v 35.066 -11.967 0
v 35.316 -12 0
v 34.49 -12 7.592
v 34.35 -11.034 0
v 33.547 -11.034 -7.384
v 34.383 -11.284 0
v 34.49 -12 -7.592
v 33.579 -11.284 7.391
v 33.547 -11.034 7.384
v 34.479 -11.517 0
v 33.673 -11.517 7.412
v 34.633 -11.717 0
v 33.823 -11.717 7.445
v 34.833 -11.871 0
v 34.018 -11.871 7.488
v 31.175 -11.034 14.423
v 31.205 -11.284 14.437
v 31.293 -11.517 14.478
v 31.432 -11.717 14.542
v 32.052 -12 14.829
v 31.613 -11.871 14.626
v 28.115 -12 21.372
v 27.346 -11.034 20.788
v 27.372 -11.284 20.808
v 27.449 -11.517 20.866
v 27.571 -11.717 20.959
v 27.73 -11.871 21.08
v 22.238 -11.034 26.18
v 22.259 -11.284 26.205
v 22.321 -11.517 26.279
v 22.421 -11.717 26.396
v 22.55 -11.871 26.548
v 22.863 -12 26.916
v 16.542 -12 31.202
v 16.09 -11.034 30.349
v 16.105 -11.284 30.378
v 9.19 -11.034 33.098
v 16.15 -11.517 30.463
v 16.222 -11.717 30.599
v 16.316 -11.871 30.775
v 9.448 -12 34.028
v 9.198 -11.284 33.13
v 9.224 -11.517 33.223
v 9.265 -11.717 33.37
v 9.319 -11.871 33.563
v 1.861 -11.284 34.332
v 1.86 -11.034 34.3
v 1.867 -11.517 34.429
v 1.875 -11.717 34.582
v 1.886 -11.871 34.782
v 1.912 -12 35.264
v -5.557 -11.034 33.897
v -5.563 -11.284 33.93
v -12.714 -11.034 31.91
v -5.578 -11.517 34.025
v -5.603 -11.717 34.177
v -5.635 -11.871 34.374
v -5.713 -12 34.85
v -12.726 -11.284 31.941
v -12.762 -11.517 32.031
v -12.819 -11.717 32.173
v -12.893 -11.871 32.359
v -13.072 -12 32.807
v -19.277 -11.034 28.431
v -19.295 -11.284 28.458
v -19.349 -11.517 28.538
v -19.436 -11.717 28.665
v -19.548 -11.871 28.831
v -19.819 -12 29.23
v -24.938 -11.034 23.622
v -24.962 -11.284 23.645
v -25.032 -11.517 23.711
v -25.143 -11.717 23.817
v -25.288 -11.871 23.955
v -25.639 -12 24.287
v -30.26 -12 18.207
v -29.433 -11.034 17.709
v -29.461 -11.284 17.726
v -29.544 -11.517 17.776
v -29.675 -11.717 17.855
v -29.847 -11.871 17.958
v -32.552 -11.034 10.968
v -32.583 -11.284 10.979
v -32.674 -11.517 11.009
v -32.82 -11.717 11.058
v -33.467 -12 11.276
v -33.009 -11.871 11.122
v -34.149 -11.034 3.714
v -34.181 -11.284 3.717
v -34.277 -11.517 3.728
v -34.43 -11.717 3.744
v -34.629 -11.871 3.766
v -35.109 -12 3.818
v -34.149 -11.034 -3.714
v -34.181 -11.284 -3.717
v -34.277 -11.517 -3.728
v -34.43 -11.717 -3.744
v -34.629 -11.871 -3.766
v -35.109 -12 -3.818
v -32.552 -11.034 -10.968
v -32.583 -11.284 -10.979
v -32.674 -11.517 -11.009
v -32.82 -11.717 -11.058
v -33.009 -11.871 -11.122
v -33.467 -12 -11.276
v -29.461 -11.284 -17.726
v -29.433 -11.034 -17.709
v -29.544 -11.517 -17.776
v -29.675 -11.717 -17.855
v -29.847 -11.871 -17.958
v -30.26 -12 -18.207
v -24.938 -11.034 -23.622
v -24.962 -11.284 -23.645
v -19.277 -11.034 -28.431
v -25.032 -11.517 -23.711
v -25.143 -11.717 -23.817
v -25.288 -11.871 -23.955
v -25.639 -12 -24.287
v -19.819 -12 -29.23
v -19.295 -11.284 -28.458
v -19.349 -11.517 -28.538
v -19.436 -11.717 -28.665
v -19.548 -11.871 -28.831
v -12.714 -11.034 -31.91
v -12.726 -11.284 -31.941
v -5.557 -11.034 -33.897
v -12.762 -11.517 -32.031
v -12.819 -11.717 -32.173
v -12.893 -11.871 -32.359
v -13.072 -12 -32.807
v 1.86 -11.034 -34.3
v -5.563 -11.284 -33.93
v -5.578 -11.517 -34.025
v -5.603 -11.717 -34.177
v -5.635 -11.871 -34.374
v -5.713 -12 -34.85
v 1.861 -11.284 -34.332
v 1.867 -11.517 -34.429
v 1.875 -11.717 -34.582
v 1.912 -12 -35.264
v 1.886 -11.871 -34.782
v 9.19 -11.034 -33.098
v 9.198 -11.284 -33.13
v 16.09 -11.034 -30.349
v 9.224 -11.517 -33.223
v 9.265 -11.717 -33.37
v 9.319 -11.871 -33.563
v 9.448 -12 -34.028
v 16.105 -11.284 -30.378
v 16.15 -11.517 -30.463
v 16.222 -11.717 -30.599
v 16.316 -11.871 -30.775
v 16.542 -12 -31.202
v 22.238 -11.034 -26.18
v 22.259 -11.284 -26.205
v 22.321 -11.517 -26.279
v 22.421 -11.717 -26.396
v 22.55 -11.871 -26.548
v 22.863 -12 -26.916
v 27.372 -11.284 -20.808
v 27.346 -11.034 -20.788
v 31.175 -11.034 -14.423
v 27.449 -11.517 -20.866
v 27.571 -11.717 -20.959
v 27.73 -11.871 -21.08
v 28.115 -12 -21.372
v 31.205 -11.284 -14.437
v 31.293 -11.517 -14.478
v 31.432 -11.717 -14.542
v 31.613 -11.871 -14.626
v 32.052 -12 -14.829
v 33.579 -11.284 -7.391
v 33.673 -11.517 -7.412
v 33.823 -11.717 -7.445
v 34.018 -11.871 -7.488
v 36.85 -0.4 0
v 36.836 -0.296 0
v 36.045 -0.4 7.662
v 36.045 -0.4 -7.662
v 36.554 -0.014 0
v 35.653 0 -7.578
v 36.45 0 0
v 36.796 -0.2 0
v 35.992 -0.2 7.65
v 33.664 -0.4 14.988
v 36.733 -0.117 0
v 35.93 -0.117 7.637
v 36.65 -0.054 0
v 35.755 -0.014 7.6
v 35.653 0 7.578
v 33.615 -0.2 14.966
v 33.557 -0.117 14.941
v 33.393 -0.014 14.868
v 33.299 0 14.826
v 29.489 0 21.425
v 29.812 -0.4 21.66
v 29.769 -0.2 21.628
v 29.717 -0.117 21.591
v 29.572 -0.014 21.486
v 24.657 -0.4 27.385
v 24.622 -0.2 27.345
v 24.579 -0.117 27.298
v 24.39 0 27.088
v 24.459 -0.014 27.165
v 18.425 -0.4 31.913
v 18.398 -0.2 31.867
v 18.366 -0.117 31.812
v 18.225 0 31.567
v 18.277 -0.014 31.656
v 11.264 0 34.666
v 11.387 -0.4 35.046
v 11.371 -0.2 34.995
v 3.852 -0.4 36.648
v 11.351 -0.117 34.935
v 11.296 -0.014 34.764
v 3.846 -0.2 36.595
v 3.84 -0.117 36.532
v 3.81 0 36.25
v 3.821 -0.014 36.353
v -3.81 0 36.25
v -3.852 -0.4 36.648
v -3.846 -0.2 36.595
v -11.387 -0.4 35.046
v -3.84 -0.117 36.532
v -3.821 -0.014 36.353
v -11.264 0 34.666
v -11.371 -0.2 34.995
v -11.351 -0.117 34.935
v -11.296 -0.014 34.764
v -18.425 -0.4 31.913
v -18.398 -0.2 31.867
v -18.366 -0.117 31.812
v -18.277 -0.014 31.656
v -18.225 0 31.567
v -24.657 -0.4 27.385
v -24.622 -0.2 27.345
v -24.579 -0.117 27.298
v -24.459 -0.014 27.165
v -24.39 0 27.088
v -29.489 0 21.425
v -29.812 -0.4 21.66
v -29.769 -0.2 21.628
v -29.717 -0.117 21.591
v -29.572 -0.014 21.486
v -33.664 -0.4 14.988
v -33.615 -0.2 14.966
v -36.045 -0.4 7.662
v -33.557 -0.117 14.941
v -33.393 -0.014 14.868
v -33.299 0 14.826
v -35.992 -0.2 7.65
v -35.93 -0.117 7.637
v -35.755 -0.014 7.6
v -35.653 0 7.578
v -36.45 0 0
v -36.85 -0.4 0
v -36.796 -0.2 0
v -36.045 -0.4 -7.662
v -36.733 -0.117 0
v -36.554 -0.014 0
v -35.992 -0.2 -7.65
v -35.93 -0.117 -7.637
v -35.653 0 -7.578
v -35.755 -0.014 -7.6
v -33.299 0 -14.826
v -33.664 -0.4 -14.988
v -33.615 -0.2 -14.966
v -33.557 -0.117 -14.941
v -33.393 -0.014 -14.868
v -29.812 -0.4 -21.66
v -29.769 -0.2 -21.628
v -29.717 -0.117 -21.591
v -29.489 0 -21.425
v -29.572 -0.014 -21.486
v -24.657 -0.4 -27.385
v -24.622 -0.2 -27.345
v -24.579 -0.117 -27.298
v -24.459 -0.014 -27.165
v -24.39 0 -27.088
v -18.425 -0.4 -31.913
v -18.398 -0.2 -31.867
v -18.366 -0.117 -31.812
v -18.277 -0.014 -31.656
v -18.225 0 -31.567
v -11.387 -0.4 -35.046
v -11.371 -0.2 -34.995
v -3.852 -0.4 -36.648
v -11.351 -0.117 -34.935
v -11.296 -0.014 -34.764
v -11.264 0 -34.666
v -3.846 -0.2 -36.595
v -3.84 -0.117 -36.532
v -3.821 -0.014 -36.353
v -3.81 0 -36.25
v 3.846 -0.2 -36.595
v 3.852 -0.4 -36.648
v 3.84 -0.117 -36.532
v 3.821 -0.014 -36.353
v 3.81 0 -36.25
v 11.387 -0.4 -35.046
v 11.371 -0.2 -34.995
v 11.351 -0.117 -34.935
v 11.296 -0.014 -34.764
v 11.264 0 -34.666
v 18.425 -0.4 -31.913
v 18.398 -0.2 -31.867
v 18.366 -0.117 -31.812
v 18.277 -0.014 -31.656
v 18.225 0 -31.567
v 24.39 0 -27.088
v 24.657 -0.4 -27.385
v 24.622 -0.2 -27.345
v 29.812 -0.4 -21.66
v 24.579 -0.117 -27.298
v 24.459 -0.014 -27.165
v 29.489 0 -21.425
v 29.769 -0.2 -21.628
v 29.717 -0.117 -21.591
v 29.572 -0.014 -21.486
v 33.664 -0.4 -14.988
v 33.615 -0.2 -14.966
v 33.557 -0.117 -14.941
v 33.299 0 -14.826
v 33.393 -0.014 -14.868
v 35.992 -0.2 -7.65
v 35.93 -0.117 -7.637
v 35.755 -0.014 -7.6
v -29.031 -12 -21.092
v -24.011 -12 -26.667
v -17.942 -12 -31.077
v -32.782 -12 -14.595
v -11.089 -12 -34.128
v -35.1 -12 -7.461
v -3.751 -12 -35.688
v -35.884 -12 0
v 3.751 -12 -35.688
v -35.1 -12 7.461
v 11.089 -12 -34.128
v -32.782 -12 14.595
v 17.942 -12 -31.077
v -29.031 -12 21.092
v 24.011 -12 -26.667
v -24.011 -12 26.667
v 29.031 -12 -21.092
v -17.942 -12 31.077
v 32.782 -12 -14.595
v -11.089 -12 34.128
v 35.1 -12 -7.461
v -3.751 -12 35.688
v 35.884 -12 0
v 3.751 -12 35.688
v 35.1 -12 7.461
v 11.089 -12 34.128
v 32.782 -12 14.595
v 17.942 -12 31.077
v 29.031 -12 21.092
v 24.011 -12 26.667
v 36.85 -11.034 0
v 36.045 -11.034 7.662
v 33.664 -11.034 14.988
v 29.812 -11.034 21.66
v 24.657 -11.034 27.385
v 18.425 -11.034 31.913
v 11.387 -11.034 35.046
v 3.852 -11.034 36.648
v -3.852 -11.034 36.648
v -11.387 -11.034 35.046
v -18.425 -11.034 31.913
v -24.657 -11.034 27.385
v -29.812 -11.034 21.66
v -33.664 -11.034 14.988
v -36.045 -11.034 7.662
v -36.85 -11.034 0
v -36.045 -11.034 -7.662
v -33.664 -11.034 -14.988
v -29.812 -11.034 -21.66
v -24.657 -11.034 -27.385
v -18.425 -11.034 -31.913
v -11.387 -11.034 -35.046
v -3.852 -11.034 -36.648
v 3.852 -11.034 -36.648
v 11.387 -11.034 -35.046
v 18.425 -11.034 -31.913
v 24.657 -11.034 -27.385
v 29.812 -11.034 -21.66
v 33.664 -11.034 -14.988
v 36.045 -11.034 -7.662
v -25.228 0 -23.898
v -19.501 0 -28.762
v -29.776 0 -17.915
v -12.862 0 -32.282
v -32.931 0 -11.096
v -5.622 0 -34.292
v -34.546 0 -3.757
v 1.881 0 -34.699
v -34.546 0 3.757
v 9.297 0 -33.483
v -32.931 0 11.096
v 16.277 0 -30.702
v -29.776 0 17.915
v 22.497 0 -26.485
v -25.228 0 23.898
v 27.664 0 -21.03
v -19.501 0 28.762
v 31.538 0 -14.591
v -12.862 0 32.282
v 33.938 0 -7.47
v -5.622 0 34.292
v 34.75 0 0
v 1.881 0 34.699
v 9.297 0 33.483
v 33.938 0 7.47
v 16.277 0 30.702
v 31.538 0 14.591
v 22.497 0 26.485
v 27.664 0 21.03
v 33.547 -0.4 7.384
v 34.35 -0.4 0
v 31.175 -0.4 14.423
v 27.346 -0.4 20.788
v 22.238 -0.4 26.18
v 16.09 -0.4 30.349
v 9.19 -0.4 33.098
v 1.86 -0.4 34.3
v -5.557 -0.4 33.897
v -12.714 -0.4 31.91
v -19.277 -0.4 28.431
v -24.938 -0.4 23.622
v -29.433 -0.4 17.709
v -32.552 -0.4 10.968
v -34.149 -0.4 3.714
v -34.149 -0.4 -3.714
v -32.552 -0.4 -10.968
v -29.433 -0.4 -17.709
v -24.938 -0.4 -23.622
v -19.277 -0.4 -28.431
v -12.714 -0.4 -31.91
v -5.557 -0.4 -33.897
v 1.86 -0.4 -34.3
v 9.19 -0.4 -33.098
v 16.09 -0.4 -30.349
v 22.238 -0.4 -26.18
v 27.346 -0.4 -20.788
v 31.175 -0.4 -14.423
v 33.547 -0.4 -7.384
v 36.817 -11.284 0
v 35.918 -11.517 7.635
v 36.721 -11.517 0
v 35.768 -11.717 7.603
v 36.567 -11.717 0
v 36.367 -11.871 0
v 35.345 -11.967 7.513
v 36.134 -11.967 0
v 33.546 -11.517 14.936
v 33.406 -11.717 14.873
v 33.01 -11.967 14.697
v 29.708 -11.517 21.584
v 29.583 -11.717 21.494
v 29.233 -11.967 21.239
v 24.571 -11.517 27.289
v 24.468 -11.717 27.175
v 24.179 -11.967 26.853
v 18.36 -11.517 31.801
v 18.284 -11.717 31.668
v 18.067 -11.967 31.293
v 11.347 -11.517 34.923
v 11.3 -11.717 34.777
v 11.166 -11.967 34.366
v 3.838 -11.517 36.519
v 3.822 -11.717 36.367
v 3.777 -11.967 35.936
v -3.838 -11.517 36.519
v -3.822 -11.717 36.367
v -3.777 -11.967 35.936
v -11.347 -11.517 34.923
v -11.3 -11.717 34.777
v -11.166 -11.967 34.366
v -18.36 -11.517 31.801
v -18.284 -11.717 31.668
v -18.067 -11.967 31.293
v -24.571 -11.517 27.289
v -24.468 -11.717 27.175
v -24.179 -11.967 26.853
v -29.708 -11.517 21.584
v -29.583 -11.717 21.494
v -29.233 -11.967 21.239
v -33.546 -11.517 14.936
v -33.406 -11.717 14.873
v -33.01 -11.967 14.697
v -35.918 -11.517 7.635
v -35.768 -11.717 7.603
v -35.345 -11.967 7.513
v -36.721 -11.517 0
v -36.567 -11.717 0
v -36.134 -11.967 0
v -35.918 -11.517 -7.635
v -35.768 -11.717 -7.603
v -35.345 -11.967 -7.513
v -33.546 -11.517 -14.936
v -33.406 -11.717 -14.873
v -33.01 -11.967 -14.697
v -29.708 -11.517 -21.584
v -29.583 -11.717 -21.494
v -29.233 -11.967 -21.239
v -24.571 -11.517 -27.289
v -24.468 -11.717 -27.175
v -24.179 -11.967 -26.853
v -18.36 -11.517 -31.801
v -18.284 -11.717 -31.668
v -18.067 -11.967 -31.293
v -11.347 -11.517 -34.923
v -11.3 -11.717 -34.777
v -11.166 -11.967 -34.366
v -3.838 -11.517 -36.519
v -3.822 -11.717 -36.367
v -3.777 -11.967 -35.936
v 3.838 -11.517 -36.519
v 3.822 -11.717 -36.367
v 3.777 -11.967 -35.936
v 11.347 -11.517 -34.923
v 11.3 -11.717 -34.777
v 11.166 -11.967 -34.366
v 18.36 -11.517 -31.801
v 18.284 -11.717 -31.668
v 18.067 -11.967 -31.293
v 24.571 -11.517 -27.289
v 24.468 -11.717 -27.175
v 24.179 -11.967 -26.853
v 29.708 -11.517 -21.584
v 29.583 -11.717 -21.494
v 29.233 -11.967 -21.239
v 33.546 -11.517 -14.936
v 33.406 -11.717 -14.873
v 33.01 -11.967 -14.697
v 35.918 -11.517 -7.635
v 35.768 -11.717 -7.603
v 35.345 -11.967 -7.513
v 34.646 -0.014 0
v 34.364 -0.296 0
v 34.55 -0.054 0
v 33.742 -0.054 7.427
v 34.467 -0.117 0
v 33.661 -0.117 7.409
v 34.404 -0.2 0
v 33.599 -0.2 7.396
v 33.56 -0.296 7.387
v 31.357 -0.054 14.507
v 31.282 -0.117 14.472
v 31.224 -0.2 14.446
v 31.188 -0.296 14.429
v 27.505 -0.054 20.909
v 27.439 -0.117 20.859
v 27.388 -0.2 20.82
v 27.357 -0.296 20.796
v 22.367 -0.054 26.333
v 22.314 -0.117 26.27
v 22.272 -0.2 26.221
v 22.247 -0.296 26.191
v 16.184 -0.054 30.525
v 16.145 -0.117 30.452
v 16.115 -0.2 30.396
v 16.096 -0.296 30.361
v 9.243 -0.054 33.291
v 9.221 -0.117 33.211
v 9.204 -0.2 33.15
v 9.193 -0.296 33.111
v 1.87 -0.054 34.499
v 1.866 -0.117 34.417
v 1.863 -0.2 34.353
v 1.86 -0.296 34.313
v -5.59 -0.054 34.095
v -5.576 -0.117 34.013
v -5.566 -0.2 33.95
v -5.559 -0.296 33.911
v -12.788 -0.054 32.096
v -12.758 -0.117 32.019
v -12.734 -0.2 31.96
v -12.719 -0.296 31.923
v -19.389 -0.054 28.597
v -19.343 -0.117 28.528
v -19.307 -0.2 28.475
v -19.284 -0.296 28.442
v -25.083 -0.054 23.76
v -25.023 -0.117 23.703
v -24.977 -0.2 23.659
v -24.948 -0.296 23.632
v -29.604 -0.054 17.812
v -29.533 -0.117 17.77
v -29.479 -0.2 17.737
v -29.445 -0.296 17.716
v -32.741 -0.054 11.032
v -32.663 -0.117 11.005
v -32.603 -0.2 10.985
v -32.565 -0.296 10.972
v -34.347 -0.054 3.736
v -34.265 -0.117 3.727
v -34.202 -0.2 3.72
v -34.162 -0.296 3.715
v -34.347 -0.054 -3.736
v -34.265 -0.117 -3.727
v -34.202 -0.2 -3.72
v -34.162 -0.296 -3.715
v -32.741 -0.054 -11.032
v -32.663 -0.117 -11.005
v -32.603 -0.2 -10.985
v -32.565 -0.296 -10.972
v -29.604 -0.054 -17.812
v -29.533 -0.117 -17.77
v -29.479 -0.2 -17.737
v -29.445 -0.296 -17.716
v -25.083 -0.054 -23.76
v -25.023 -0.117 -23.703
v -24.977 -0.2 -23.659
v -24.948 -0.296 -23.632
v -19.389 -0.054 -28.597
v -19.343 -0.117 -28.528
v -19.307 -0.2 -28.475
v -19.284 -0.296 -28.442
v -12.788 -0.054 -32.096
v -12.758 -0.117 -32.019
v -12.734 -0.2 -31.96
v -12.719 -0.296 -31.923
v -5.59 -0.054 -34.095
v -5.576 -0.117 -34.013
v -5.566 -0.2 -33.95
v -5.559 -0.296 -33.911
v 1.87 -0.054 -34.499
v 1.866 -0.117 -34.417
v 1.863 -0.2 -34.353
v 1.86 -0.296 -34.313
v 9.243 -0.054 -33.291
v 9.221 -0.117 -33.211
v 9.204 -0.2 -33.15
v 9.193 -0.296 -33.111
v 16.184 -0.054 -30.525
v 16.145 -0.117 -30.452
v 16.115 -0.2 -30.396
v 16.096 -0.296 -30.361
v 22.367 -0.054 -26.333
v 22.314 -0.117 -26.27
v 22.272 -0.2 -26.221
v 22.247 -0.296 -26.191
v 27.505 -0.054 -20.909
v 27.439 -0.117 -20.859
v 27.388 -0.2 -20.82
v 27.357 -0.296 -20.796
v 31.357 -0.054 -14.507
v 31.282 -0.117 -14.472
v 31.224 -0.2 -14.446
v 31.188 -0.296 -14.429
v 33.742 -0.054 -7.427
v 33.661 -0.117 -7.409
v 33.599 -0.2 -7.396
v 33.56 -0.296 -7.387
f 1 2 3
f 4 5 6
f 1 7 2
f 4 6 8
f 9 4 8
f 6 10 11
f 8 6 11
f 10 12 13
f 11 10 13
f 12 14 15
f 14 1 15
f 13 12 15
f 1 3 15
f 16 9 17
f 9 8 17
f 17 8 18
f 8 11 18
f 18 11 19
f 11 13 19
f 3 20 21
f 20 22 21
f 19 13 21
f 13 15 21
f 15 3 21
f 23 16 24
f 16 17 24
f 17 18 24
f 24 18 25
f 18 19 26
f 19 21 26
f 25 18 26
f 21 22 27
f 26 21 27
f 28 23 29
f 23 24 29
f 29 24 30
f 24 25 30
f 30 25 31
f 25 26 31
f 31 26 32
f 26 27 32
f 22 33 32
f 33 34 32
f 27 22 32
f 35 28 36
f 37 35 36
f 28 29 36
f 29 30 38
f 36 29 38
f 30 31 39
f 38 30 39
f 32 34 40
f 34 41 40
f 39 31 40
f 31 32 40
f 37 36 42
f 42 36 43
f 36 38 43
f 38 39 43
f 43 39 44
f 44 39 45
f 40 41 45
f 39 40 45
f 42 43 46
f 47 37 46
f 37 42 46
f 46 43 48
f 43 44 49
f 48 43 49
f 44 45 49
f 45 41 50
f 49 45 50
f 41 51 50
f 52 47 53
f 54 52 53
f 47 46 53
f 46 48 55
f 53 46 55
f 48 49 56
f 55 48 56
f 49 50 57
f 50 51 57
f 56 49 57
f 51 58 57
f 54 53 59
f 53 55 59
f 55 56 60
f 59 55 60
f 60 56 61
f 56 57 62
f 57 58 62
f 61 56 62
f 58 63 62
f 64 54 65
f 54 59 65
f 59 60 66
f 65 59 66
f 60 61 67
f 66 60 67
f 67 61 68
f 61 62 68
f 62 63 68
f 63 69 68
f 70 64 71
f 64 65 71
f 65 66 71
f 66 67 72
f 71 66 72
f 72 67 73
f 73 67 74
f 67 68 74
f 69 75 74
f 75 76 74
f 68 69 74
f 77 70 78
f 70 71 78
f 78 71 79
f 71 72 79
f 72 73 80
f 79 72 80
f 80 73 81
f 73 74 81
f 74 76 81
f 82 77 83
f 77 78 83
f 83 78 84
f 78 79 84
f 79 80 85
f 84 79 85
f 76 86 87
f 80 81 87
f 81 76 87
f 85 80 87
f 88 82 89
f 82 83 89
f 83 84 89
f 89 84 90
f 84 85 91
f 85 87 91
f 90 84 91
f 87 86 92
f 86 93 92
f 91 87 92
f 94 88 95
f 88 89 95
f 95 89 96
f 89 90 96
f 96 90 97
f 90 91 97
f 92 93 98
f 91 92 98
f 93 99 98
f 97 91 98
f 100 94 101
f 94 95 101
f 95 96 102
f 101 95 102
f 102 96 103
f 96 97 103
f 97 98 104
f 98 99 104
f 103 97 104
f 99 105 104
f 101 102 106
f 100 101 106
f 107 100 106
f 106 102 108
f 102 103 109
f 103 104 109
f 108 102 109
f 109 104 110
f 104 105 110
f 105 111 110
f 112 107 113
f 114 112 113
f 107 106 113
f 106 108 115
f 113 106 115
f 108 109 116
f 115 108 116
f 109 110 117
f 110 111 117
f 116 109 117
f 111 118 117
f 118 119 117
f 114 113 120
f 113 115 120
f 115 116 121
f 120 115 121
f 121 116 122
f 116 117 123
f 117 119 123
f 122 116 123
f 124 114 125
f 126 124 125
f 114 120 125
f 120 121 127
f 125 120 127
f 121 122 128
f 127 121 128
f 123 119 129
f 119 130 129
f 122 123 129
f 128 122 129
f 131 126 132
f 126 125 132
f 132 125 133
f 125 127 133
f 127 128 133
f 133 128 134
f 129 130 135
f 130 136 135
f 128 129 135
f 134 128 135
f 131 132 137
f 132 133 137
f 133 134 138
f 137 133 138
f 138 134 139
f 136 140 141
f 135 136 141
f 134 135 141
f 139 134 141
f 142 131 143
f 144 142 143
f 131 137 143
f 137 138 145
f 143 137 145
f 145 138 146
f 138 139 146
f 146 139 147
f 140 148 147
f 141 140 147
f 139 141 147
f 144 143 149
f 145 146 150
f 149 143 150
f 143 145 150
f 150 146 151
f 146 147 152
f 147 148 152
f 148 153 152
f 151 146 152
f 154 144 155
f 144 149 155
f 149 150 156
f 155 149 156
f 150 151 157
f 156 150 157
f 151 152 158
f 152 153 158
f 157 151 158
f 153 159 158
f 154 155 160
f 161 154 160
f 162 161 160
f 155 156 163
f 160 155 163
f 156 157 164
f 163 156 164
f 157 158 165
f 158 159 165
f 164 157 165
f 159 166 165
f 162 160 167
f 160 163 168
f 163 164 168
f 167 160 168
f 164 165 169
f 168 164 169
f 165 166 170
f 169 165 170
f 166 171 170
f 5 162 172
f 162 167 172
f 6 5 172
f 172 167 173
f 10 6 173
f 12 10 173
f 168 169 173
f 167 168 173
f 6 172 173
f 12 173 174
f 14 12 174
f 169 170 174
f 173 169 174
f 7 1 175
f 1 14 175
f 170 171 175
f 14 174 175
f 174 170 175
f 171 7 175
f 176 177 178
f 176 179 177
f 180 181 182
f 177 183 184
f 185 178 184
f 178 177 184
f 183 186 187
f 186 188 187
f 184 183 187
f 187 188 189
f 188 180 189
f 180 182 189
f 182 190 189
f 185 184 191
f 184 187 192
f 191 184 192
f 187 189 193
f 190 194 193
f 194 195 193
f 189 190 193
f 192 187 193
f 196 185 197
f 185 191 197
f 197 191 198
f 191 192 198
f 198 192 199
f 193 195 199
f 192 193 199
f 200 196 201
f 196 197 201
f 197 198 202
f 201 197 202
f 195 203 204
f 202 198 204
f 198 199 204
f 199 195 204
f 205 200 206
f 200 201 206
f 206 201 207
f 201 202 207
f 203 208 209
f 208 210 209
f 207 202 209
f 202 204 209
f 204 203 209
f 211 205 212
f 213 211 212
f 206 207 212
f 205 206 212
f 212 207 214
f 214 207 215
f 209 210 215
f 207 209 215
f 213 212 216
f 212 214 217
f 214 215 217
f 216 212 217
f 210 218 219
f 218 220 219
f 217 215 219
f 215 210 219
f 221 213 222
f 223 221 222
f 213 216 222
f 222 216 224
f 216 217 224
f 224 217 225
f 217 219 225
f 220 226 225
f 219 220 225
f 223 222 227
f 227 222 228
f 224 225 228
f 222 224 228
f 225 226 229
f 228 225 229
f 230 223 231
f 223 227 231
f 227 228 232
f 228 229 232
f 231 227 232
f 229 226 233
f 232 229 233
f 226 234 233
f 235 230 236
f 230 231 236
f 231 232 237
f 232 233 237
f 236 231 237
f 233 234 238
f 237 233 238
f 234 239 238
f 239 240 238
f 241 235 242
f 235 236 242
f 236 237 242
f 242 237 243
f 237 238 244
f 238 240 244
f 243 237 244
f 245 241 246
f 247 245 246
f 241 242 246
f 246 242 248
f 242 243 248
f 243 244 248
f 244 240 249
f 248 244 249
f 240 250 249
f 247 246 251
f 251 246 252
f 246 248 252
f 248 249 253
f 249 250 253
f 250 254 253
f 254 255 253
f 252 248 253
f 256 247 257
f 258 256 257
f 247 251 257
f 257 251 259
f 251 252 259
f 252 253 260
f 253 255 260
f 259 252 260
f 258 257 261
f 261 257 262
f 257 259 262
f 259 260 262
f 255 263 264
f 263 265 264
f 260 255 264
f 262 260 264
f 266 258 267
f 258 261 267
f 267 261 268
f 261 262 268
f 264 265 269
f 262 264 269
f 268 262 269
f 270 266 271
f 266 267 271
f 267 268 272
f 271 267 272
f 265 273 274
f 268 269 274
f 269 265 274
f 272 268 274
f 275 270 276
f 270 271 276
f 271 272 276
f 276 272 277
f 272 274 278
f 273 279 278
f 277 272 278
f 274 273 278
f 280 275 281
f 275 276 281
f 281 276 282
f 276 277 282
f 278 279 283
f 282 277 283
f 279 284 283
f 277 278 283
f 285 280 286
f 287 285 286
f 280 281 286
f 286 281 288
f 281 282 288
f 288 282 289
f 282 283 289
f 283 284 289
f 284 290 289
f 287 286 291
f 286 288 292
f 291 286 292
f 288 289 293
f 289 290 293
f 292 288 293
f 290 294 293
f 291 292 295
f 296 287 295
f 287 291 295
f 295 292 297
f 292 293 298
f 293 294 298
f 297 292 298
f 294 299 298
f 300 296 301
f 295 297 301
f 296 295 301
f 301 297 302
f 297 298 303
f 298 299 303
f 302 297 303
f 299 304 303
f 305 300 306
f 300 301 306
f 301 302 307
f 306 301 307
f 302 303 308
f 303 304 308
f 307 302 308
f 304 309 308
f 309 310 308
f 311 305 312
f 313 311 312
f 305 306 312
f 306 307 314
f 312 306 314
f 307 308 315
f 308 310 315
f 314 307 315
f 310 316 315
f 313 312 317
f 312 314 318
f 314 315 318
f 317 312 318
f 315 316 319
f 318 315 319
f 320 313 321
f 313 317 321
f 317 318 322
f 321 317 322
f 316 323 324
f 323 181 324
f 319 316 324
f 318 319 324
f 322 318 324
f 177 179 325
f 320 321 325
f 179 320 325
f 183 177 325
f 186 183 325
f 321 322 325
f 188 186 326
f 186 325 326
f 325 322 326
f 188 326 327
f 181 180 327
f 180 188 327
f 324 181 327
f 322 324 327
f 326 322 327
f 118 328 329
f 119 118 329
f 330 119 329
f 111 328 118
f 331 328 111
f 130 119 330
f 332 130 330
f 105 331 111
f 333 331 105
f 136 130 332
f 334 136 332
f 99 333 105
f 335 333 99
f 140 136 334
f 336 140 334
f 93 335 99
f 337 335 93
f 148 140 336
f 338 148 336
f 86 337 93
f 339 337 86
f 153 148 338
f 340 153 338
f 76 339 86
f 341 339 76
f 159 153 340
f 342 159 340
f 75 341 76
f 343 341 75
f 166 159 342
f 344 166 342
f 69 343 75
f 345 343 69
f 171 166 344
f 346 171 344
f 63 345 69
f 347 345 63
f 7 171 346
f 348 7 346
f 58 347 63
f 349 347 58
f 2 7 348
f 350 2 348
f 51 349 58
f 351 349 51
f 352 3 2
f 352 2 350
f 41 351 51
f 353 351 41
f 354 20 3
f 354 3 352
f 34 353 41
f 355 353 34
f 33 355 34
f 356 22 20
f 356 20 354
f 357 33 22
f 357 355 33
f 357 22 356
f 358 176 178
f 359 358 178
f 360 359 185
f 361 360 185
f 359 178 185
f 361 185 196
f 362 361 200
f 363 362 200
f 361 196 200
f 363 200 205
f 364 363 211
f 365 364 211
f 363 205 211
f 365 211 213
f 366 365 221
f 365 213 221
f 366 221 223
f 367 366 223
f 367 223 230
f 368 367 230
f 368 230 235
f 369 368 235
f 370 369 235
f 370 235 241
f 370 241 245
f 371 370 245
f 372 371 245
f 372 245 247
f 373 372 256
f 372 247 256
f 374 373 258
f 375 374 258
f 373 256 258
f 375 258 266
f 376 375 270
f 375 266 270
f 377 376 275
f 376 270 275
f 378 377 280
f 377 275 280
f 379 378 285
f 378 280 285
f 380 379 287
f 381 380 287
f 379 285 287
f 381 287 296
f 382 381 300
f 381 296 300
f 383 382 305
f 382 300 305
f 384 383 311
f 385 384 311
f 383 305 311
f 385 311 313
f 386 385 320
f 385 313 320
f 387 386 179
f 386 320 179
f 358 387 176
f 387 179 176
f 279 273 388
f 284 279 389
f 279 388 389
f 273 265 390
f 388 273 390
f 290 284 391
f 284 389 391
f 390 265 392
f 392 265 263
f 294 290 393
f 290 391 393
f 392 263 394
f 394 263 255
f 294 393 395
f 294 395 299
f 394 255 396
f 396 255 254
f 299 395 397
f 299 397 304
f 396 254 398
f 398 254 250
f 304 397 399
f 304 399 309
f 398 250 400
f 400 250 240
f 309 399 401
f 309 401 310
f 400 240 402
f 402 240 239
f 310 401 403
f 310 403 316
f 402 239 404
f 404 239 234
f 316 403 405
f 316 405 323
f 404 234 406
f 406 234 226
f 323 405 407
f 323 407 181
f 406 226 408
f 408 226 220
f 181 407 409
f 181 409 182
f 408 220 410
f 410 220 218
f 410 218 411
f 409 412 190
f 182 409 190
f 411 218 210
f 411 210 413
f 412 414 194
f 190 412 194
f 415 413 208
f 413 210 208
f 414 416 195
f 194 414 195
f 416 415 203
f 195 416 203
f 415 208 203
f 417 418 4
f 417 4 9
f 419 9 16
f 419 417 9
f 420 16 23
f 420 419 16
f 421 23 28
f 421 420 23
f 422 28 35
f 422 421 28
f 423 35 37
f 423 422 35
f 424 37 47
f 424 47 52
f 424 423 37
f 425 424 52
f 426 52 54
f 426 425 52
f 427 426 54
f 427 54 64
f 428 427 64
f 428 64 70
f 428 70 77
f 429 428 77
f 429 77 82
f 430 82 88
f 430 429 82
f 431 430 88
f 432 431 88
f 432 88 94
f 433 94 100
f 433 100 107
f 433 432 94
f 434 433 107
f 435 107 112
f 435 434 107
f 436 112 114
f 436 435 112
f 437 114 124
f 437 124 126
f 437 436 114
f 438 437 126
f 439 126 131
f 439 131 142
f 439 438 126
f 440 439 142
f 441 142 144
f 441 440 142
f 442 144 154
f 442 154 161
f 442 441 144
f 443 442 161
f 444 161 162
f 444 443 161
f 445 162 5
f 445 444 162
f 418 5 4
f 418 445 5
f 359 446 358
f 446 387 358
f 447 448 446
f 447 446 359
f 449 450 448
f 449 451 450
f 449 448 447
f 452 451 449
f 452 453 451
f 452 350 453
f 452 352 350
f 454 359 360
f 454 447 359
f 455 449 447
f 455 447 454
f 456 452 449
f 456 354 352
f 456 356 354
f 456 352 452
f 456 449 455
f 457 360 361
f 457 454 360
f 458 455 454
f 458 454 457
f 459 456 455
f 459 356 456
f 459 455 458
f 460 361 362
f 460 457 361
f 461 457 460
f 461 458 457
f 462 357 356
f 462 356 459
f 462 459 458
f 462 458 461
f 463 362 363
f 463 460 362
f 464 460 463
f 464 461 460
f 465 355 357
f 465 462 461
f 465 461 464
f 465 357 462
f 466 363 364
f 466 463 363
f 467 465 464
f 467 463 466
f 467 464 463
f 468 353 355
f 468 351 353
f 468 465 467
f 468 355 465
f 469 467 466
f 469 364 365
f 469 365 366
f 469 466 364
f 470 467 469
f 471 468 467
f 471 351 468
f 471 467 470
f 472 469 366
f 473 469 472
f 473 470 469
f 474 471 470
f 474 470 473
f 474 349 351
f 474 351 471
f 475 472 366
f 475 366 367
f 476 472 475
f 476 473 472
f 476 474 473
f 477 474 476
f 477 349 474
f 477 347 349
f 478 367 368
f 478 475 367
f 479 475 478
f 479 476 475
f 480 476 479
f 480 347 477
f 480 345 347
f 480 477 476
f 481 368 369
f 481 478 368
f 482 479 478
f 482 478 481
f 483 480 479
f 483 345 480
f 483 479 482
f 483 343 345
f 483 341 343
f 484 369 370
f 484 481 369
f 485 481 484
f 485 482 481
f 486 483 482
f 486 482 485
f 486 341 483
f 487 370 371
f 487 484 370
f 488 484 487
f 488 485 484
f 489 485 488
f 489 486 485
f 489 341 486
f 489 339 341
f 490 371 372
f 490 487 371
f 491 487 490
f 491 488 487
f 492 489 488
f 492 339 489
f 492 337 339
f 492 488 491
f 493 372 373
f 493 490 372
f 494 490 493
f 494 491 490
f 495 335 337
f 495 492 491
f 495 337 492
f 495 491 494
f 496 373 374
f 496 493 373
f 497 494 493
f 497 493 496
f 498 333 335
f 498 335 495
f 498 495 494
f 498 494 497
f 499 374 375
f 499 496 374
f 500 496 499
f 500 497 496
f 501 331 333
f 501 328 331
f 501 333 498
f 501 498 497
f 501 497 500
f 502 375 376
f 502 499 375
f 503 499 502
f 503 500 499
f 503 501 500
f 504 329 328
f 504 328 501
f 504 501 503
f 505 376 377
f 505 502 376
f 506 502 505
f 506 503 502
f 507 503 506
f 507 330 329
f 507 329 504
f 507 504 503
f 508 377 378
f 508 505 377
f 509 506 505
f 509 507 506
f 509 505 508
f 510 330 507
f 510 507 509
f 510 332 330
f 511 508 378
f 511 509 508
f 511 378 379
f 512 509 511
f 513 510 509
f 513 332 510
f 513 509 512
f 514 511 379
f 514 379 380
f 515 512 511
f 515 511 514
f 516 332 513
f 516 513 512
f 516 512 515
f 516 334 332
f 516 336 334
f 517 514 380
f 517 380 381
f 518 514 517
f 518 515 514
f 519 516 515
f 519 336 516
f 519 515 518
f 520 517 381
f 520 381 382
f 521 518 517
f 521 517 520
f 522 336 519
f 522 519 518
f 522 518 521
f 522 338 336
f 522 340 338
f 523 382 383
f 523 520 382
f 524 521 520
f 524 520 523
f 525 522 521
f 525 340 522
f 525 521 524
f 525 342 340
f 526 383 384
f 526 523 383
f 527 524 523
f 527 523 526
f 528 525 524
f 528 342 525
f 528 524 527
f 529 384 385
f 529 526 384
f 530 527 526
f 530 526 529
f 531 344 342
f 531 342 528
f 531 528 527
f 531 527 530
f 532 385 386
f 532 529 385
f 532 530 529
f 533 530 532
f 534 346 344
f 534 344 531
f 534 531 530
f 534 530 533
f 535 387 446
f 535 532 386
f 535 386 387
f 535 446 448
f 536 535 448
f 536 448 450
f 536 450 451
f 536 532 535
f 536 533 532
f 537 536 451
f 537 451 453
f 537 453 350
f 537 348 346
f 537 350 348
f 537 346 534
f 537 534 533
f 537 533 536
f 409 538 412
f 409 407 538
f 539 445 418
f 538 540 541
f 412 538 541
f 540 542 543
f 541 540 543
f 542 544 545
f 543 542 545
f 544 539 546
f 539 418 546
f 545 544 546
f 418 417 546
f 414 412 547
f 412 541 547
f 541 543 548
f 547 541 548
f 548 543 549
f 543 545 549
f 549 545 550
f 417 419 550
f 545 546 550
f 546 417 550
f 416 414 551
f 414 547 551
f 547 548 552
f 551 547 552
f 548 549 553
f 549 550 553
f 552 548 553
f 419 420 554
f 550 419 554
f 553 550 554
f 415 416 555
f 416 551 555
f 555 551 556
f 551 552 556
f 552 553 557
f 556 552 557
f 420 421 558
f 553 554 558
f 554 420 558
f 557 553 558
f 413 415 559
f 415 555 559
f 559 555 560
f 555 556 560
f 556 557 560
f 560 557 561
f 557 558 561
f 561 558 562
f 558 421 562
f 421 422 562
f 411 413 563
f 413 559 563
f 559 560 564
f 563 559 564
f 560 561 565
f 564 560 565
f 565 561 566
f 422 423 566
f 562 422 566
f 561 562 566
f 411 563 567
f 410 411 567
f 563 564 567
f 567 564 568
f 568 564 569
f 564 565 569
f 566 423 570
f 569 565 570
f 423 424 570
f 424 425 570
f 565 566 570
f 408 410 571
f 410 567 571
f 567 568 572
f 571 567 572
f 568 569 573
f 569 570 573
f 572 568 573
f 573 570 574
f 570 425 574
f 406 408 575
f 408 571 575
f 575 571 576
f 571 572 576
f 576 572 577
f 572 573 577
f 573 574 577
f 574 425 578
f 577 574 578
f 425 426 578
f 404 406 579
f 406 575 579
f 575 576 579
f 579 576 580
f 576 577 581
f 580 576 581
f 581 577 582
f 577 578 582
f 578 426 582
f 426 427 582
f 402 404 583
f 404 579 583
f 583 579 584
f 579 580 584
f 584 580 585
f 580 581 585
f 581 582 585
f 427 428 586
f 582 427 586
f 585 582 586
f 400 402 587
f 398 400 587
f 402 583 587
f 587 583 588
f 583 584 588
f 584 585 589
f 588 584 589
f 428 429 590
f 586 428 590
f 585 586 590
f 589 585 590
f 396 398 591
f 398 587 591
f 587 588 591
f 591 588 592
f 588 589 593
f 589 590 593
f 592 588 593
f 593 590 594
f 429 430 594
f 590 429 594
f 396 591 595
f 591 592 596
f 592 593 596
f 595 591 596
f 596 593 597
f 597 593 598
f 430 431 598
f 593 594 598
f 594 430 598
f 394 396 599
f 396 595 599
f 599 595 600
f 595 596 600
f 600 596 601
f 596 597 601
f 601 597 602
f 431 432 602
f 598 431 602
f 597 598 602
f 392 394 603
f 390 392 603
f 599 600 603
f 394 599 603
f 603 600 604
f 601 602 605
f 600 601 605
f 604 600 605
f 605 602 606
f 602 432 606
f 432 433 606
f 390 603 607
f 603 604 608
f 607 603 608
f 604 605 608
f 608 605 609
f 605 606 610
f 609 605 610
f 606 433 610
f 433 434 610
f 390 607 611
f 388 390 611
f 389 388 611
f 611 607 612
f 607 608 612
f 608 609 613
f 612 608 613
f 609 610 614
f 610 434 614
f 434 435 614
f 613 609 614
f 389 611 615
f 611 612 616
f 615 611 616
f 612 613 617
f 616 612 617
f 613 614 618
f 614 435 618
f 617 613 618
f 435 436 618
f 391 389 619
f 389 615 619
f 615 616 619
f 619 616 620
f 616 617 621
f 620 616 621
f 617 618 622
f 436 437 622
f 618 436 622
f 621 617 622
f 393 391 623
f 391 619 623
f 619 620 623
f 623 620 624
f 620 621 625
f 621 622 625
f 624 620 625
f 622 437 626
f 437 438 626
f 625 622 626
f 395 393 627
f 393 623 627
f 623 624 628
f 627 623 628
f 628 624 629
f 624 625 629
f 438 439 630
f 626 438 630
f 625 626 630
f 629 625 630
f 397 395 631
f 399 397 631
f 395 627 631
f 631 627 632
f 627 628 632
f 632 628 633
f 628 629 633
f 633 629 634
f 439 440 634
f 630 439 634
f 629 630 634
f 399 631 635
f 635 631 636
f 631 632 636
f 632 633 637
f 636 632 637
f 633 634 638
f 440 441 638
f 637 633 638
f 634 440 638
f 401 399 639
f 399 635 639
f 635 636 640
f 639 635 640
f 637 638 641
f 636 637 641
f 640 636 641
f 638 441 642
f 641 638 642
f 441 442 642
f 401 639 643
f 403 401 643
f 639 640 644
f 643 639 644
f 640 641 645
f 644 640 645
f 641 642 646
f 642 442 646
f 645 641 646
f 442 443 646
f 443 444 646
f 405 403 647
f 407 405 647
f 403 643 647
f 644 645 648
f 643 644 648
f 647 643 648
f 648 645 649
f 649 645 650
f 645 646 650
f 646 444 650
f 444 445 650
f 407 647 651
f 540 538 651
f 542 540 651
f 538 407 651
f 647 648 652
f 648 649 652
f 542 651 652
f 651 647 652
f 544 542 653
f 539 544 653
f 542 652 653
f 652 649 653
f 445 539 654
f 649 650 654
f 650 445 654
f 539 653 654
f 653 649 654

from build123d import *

# Parameters (mm, degrees)
F0_R     = 36.85
F0_R_2   = 34.35
F1_DEPTH = 12
F2_R     = 0.965685
F3_R     = 0.4


with BuildPart() as f1:
    # F0 (on Front) → F1 (new body)
    with BuildSketch(Plane.XZ):
        Circle(F0_R)
        Circle(F0_R_2, mode=Mode.SUBTRACT)
    extrude(amount=F1_DEPTH)

    # F2
    f2_edges = [f1.edges().sort_by_distance(p)[0] for p in [
        (-34.35, -12, 0),
        (-36.85, -12, 0),
    ]]
    fillet(f2_edges, radius=F2_R)

    # F3
    f3_edges = [f1.edges().sort_by_distance(p)[0] for p in [
        (-34.35, 0, 0),
        (-36.85, 0, 0),
    ]]
    fillet(f3_edges, radius=F3_R)


solid = f1.part
